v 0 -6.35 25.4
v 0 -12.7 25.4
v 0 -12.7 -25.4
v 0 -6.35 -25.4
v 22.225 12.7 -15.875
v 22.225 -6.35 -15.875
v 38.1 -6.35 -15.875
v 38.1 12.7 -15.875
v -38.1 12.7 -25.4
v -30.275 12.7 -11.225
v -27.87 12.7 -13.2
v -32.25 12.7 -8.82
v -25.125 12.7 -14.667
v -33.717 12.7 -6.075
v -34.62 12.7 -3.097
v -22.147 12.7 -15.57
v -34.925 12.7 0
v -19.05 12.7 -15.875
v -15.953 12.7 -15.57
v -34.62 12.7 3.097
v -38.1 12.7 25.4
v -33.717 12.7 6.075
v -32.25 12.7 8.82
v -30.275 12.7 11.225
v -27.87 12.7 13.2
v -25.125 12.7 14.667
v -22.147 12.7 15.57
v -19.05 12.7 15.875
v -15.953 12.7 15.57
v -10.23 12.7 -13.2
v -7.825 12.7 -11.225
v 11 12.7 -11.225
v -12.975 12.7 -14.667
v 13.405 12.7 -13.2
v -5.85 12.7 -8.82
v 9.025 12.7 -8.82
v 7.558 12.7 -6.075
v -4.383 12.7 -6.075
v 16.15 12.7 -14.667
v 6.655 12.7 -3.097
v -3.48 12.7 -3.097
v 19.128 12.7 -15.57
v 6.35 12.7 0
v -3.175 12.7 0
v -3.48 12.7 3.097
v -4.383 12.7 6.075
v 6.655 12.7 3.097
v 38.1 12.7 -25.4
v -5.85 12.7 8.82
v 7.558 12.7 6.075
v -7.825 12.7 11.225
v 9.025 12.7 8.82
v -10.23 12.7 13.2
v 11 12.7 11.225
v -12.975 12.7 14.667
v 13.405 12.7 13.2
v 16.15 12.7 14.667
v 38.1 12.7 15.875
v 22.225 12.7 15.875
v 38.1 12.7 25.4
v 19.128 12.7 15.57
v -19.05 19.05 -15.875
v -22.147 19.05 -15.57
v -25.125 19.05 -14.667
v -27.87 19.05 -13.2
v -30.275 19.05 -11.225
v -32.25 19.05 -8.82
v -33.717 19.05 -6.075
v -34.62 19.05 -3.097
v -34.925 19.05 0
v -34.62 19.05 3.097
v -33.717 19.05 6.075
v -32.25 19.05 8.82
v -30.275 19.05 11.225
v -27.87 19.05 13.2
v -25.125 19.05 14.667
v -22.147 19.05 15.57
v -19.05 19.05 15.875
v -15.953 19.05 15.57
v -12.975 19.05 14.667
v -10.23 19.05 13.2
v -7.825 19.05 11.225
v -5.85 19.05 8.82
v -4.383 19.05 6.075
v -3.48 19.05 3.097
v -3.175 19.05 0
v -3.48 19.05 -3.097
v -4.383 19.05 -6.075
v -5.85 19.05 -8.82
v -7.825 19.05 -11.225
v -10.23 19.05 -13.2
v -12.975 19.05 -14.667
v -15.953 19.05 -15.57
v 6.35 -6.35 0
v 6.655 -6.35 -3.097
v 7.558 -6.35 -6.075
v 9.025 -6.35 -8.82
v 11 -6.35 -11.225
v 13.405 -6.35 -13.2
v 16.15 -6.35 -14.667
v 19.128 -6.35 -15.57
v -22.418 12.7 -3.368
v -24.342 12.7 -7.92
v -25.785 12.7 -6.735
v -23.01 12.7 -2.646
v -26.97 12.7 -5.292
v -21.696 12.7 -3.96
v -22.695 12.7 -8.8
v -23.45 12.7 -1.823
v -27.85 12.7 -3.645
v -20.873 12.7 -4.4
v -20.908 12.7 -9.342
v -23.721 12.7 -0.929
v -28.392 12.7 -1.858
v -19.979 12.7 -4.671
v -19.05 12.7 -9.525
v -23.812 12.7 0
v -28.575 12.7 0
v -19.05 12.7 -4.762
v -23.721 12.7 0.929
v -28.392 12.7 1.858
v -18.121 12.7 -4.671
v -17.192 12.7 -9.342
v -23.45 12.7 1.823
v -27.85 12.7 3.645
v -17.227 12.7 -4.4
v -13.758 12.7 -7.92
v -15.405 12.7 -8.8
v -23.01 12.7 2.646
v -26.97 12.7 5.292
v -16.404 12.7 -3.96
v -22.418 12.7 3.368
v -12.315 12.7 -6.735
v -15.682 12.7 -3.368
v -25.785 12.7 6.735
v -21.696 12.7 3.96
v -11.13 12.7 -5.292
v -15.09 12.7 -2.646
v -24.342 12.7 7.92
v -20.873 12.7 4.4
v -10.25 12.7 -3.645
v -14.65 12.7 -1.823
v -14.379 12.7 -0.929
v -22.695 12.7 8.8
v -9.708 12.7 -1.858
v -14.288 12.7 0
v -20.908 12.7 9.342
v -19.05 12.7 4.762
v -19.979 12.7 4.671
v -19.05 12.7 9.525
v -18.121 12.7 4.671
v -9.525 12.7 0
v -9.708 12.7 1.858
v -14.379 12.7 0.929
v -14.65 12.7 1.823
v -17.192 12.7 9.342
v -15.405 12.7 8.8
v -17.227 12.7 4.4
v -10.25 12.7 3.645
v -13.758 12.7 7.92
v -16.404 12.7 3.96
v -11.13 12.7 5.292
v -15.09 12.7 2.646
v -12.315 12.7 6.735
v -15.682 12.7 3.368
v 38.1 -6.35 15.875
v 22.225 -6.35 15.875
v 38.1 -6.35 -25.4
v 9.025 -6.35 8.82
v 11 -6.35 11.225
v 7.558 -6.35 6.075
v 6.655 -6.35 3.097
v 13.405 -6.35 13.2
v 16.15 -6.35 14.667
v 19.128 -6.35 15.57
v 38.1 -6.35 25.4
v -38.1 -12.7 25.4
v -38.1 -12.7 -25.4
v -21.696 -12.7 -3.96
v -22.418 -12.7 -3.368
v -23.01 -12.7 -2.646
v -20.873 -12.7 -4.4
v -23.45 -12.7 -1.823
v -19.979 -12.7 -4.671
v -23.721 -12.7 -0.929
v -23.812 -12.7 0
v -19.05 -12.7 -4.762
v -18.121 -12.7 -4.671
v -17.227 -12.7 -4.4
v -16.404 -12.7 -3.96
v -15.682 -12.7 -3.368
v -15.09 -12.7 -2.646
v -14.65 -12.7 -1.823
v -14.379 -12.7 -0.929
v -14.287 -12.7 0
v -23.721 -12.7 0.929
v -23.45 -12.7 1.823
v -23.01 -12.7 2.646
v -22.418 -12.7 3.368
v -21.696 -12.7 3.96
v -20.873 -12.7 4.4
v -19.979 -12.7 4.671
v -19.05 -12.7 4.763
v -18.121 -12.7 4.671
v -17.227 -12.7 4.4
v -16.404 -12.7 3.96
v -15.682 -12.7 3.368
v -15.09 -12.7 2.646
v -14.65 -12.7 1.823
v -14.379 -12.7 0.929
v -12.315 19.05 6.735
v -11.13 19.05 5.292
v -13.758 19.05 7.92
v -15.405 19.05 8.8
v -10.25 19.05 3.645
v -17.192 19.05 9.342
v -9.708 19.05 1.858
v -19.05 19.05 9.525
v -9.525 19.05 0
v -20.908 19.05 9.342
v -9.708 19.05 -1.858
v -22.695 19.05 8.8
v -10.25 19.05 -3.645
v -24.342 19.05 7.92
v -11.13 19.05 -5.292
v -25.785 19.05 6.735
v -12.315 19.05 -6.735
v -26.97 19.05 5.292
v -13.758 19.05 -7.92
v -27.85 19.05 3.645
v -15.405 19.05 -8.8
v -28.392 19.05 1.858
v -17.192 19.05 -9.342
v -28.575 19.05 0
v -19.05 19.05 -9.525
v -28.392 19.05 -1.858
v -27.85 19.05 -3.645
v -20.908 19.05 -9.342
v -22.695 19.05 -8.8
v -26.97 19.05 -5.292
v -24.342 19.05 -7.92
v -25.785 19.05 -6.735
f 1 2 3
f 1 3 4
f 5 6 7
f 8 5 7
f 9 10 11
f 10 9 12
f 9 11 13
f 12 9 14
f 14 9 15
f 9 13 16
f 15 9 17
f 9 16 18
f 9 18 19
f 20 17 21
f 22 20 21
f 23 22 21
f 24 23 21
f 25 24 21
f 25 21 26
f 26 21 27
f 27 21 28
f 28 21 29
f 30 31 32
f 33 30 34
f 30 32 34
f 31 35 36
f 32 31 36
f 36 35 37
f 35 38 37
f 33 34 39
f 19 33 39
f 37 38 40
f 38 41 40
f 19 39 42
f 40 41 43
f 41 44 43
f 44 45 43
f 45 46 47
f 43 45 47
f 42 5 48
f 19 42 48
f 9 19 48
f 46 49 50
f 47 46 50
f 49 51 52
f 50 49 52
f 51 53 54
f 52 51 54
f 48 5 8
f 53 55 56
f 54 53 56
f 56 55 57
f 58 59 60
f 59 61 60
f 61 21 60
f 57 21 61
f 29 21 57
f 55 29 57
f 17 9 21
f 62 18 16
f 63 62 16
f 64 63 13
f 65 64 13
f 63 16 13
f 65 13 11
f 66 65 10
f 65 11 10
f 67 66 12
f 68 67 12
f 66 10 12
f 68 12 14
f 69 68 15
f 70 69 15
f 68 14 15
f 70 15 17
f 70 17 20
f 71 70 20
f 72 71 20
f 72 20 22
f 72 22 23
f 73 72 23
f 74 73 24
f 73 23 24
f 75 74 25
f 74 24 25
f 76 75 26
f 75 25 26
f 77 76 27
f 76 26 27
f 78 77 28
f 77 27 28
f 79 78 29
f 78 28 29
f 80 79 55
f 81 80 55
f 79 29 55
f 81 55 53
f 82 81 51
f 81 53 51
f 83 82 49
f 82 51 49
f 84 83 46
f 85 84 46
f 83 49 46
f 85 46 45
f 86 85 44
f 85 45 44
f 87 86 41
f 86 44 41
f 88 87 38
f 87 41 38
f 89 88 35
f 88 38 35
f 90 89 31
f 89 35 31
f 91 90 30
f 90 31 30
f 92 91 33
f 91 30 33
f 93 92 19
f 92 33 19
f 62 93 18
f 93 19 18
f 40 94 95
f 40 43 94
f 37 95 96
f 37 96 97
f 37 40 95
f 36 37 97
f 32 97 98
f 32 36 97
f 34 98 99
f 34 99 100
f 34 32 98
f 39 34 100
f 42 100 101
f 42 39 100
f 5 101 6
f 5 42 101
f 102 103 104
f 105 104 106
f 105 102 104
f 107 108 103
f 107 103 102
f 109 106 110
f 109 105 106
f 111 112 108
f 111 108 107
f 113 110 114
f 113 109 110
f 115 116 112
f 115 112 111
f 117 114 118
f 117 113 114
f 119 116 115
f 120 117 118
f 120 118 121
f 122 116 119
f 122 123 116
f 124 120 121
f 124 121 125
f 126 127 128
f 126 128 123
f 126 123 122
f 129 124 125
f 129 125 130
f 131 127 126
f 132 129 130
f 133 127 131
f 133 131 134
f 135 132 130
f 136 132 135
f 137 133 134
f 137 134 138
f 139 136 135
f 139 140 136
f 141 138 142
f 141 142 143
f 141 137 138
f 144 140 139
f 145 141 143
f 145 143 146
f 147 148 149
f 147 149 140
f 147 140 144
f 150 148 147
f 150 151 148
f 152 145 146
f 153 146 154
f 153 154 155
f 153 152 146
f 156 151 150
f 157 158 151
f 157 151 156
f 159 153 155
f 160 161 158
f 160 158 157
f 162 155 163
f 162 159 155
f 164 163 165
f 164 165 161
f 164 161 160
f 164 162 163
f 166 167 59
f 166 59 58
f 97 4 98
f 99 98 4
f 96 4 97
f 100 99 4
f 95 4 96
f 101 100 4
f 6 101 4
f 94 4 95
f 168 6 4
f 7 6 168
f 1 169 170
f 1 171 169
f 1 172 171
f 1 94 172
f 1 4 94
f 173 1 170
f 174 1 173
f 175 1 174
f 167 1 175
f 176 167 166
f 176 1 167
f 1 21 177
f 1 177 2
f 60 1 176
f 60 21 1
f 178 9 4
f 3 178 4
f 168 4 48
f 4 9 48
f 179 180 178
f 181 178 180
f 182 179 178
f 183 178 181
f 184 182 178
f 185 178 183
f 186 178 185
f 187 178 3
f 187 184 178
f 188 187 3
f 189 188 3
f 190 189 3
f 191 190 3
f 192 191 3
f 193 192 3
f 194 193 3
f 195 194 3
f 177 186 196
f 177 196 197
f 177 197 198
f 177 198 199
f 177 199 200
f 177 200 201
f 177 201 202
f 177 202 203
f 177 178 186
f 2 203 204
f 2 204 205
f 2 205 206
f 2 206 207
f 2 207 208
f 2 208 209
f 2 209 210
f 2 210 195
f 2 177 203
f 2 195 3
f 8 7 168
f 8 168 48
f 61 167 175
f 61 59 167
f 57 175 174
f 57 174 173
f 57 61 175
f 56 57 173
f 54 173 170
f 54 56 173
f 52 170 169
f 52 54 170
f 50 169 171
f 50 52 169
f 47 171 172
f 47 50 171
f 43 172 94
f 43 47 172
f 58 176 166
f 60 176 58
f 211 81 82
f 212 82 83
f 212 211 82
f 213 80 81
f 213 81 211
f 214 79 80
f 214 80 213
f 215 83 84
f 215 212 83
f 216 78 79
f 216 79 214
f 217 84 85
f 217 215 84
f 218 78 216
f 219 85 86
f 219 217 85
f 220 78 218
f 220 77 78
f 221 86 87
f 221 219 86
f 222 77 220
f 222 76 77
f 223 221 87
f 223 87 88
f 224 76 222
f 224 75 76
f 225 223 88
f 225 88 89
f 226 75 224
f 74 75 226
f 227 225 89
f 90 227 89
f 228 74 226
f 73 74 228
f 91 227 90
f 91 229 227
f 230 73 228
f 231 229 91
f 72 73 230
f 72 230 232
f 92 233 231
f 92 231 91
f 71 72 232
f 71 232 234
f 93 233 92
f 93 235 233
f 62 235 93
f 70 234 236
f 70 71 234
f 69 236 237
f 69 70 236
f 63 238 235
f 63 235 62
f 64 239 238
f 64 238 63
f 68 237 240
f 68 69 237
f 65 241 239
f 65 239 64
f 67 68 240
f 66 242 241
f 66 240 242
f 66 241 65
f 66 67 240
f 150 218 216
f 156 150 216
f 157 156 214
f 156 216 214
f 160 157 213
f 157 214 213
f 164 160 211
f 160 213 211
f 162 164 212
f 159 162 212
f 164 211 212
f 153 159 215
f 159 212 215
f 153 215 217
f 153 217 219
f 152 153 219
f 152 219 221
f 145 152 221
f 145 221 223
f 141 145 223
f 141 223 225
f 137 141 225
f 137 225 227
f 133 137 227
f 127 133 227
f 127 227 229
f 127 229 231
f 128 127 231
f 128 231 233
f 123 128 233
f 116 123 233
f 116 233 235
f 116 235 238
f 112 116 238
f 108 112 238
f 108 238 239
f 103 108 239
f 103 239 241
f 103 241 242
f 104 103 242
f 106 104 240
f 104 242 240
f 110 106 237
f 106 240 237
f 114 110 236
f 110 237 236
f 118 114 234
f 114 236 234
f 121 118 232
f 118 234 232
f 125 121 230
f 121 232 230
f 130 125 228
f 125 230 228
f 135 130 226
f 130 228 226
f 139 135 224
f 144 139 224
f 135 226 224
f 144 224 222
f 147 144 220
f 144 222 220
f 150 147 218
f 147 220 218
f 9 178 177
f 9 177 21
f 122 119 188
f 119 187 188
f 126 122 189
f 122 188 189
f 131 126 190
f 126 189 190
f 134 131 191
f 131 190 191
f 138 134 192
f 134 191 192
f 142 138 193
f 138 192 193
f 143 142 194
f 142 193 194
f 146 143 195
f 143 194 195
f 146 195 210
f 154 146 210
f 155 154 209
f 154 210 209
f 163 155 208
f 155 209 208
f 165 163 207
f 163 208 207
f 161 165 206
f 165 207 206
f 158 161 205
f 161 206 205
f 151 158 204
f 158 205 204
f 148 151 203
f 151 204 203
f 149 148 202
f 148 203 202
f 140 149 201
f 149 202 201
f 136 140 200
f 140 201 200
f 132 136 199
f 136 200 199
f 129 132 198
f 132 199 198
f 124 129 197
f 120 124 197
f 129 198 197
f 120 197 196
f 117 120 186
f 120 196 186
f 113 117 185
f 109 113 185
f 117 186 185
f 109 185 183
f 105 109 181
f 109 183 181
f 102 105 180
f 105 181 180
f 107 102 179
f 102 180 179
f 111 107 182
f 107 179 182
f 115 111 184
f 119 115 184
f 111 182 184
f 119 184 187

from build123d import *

# Parameters (mm, degrees)
SKETCH2_W               = 76.2
SKETCH2_H               = 25.4
BOSS_EXTRUDE1_DEPTH     = 25.4
SKETCH3_W               = 38.1
SKETCH3_H               = 6.35
CUT_EXTRUDE1_DEPTH      = 65.757547823
CUT_EXTRUDE2_DEPTH      = 48.519048812
CUT_EXTRUDE2_DEPTH_BACK = 48.519048812
SKETCH4_W               = 31.75
SKETCH4_H               = 31.75
FILLET2_R               = 15.875
SKETCH5_R               = 15.875
BOSS_EXTRUDE2_DEPTH     = 6.35
HOLE1_D                 = 9.525
HOLE1_DEPTH             = 31.75
HOLE1_CBORE_D           = 19.05
HOLE1_CBORE_DEPTH       = 6.35
HOLE1_TIP               = 2.861598698


with BuildPart() as part:
    # Sketch2 → Boss-Extrude1 (new, symmetric)
    with BuildSketch(Plane.XY):
        Rectangle(SKETCH2_W, SKETCH2_H)
    extrude(amount=BOSS_EXTRUDE1_DEPTH, both=True)

    # Sketch3 → Cut-Extrude1 (cut, through all)
    with BuildSketch(Plane.XY.offset(25.4)):
        with Locations((19.05, -9.525)):
            Rectangle(SKETCH3_W, SKETCH3_H)
    extrude(amount=-CUT_EXTRUDE1_DEPTH, mode=Mode.SUBTRACT)

    # Sketch4 → Cut-Extrude2 (cut, two sides: drawn at the far end of the back side and taken through both)
    with BuildSketch(Plane(origin=(0, 0, 0), x_dir=(1, 0, 0), z_dir=(0, 1, 0)).offset(-CUT_EXTRUDE2_DEPTH_BACK)):
        with Locations((22.225, 0)):
            Rectangle(SKETCH4_W, SKETCH4_H)
    extrude(amount=CUT_EXTRUDE2_DEPTH + CUT_EXTRUDE2_DEPTH_BACK, mode=Mode.SUBTRACT)

    # Fillet2
    fillet2_edges = [part.edges().sort_by_distance(p)[0] for p in [
        (6.35, 3.175, 15.875),
        (6.35, 3.175, -15.875),
    ]]
    fillet(fillet2_edges, radius=FILLET2_R - 0.0001)  # a hair under: the kernel refuses the full size

    # Sketch5 → Boss-Extrude2 (add)
    with BuildSketch(Plane(origin=(0, 12.7, 0), x_dir=(1, 0, 0), z_dir=(0, 1, 0))):
        with Locations(Location((-19.05, 0, 0), (0, 0, 90))):
            Circle(SKETCH5_R)
    extrude(amount=BOSS_EXTRUDE2_DEPTH)

    # Hole1
    with Locations(Plane(origin=(-19.05, 19.05, 0), x_dir=(0, 0, 1), z_dir=(0, 1, 0))):
        with Locations((0, 0)):
            CounterBoreHole(HOLE1_D / 2, HOLE1_CBORE_D / 2, HOLE1_CBORE_DEPTH, depth=HOLE1_DEPTH)
            with Locations((0, 0, -(HOLE1_DEPTH + HOLE1_TIP / 2))):  # 118° drill point
                Cone(0, HOLE1_D / 2, HOLE1_TIP, mode=Mode.SUBTRACT)


solid = part.part
